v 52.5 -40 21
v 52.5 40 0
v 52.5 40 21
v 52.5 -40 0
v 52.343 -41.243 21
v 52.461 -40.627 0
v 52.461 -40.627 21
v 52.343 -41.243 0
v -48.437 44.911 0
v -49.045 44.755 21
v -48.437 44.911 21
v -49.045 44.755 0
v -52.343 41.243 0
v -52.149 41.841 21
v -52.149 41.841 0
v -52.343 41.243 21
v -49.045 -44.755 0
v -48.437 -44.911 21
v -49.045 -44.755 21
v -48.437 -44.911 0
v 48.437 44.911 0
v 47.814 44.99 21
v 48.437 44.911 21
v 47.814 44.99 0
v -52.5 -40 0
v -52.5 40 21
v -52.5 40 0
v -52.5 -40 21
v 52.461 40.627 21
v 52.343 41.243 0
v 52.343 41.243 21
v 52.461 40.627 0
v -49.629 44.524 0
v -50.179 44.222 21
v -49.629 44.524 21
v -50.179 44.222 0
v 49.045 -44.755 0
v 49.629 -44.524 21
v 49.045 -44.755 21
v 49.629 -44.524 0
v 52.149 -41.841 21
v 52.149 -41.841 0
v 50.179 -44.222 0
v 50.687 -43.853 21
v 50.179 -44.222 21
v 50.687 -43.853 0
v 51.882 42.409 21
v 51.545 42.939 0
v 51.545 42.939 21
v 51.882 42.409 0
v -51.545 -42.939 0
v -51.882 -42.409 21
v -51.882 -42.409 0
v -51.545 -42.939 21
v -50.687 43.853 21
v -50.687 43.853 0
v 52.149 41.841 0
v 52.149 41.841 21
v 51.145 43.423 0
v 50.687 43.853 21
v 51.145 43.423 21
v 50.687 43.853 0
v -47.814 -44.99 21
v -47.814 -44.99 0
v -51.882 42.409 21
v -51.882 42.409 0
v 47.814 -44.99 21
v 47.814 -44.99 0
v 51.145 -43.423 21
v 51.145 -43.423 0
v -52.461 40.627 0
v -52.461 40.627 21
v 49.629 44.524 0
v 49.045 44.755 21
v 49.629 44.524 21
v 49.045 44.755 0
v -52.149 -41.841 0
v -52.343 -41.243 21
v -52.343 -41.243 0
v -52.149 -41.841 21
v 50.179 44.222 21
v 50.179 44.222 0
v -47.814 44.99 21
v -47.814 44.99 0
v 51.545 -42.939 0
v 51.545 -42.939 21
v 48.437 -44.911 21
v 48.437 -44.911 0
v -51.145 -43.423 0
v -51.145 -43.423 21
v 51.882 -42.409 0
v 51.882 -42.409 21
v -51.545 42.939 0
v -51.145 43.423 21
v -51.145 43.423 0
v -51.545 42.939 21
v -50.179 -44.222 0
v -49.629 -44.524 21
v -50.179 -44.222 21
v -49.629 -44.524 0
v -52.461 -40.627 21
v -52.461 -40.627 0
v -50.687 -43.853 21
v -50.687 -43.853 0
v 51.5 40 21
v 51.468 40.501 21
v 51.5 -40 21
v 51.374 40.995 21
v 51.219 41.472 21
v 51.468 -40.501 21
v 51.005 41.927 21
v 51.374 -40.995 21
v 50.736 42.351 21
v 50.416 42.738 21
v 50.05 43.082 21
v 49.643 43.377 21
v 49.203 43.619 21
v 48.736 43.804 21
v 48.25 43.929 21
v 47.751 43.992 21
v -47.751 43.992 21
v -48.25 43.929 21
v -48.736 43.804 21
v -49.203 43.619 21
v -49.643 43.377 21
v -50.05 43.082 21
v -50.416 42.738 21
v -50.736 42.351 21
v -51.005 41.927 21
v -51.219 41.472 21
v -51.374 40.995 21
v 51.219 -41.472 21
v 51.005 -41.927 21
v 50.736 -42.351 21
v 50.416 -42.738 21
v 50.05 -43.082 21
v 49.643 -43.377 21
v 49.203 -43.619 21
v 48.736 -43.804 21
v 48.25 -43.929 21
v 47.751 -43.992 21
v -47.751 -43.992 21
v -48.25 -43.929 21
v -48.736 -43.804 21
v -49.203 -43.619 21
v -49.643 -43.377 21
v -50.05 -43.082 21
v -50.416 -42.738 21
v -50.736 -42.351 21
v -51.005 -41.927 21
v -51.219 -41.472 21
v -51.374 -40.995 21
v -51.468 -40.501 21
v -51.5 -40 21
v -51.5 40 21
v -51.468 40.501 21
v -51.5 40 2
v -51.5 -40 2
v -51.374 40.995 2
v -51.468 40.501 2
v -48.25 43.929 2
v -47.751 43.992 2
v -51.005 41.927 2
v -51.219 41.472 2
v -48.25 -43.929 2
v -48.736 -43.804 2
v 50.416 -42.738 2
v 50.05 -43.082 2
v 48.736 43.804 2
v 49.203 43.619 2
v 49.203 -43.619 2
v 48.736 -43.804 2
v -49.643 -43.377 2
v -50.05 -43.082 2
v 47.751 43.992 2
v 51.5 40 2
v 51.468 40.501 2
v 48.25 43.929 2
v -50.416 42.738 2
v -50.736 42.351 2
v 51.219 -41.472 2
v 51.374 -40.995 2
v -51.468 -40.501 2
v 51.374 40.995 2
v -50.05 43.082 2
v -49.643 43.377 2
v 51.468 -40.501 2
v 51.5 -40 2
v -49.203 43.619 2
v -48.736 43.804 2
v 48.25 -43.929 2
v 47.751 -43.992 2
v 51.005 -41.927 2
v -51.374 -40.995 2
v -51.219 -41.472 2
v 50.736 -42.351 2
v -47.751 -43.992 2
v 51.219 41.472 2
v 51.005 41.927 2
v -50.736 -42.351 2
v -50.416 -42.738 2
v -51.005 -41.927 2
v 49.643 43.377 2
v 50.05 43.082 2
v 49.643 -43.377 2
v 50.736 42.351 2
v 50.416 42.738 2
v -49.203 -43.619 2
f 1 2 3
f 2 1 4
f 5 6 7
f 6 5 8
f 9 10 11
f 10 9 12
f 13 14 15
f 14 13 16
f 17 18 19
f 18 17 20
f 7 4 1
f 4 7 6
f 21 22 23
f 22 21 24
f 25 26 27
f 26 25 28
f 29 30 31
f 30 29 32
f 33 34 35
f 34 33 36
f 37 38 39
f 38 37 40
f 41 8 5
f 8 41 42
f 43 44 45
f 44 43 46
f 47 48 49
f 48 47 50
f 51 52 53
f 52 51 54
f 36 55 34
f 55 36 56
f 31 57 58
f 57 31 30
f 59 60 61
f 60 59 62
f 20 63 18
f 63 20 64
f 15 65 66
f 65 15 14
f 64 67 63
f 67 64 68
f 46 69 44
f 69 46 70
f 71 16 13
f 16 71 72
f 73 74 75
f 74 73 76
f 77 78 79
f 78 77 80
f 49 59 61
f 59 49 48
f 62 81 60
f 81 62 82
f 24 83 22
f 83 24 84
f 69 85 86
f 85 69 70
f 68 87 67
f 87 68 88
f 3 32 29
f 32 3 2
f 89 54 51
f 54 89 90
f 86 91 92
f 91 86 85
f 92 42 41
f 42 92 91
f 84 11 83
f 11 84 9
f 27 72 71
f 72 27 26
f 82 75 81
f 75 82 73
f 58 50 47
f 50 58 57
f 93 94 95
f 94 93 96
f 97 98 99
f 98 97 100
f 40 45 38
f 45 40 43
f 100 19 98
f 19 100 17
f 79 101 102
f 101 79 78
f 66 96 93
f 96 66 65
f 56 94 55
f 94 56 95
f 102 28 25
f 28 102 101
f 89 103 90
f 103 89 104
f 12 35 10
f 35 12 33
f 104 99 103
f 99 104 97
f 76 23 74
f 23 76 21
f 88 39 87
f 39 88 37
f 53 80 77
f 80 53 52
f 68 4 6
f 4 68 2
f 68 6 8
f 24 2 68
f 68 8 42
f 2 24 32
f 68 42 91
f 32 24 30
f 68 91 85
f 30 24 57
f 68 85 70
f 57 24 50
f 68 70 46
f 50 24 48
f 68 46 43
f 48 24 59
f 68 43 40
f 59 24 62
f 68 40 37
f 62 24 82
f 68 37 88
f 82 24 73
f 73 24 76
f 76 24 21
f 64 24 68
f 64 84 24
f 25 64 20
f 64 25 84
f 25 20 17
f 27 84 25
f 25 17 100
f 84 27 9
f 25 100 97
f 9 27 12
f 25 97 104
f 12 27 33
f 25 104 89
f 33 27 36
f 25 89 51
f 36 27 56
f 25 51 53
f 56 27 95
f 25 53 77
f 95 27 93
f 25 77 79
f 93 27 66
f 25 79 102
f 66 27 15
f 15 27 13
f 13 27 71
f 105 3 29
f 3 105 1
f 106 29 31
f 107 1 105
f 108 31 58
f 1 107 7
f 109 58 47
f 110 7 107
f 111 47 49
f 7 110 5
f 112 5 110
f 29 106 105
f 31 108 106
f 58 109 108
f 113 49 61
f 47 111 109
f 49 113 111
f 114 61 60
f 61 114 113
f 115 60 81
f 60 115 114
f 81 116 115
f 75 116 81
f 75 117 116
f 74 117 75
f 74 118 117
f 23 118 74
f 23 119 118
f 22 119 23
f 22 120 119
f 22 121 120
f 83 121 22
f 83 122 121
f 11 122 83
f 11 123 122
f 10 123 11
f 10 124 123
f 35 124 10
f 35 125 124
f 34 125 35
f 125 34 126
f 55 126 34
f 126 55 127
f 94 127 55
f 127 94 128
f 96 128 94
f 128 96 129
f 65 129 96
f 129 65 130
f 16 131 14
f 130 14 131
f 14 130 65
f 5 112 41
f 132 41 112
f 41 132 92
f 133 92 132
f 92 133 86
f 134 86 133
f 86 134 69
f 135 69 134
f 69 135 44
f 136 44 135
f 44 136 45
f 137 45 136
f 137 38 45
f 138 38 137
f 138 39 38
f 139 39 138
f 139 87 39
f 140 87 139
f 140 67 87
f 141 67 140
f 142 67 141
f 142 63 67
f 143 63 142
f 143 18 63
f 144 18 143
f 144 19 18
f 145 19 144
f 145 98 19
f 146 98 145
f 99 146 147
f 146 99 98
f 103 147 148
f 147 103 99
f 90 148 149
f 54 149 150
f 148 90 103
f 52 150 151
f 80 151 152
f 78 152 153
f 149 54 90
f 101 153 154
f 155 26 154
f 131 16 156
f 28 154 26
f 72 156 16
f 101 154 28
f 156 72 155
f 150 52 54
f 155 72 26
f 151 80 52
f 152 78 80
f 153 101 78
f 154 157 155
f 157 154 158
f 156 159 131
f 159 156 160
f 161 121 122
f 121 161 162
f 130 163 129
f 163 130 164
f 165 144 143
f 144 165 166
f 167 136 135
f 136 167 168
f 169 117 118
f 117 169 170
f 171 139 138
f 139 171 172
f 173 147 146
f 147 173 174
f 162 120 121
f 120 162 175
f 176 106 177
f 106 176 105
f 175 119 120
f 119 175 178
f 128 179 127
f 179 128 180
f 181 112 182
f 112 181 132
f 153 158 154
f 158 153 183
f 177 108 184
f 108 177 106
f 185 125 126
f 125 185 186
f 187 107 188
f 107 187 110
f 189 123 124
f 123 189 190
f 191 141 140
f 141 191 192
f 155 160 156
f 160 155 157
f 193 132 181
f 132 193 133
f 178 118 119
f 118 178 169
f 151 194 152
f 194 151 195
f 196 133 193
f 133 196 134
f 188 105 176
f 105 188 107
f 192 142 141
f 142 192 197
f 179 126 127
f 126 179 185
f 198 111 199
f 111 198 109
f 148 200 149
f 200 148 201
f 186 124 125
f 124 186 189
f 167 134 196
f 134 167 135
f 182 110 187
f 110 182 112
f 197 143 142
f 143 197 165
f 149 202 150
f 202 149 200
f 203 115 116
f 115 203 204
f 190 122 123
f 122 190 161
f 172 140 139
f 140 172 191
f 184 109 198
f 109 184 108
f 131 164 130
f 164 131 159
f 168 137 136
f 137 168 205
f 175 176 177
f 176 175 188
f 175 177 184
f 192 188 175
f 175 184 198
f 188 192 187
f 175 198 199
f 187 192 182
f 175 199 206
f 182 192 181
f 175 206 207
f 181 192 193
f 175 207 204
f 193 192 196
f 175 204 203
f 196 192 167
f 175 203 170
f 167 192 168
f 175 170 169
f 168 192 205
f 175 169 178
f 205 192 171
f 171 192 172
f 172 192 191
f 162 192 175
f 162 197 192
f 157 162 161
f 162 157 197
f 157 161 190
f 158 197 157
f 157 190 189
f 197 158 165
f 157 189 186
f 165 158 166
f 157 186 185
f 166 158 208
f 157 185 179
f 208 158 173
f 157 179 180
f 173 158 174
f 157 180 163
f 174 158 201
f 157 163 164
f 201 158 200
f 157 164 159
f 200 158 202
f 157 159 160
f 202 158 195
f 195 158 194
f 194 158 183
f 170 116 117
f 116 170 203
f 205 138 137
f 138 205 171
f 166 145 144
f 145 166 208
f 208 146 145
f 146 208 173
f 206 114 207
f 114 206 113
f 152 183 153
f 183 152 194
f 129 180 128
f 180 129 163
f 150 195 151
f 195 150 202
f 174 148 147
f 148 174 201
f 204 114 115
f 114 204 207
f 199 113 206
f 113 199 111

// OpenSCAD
$fn = 50;


difference() {
	union() {
		hull() {
			translate(v = [-47.5000000000, 40.0000000000, 0]) {
				cylinder(h = 21, r = 5);
			}
			translate(v = [47.5000000000, 40.0000000000, 0]) {
				cylinder(h = 21, r = 5);
			}
			translate(v = [-47.5000000000, -40.0000000000, 0]) {
				cylinder(h = 21, r = 5);
			}
			translate(v = [47.5000000000, -40.0000000000, 0]) {
				cylinder(h = 21, r = 5);
			}
		}
	}
	union() {
		translate(v = [0, 0, 2]) {
			hull() {
				translate(v = [-47.5000000000, 40.0000000000, 0]) {
					cylinder(h = 19, r = 4);
				}
				translate(v = [47.5000000000, 40.0000000000, 0]) {
					cylinder(h = 19, r = 4);
				}
				translate(v = [-47.5000000000, -40.0000000000, 0]) {
					cylinder(h = 19, r = 4);
				}
				translate(v = [47.5000000000, -40.0000000000, 0]) {
					cylinder(h = 19, r = 4);
				}
			}
		}
	}
}
